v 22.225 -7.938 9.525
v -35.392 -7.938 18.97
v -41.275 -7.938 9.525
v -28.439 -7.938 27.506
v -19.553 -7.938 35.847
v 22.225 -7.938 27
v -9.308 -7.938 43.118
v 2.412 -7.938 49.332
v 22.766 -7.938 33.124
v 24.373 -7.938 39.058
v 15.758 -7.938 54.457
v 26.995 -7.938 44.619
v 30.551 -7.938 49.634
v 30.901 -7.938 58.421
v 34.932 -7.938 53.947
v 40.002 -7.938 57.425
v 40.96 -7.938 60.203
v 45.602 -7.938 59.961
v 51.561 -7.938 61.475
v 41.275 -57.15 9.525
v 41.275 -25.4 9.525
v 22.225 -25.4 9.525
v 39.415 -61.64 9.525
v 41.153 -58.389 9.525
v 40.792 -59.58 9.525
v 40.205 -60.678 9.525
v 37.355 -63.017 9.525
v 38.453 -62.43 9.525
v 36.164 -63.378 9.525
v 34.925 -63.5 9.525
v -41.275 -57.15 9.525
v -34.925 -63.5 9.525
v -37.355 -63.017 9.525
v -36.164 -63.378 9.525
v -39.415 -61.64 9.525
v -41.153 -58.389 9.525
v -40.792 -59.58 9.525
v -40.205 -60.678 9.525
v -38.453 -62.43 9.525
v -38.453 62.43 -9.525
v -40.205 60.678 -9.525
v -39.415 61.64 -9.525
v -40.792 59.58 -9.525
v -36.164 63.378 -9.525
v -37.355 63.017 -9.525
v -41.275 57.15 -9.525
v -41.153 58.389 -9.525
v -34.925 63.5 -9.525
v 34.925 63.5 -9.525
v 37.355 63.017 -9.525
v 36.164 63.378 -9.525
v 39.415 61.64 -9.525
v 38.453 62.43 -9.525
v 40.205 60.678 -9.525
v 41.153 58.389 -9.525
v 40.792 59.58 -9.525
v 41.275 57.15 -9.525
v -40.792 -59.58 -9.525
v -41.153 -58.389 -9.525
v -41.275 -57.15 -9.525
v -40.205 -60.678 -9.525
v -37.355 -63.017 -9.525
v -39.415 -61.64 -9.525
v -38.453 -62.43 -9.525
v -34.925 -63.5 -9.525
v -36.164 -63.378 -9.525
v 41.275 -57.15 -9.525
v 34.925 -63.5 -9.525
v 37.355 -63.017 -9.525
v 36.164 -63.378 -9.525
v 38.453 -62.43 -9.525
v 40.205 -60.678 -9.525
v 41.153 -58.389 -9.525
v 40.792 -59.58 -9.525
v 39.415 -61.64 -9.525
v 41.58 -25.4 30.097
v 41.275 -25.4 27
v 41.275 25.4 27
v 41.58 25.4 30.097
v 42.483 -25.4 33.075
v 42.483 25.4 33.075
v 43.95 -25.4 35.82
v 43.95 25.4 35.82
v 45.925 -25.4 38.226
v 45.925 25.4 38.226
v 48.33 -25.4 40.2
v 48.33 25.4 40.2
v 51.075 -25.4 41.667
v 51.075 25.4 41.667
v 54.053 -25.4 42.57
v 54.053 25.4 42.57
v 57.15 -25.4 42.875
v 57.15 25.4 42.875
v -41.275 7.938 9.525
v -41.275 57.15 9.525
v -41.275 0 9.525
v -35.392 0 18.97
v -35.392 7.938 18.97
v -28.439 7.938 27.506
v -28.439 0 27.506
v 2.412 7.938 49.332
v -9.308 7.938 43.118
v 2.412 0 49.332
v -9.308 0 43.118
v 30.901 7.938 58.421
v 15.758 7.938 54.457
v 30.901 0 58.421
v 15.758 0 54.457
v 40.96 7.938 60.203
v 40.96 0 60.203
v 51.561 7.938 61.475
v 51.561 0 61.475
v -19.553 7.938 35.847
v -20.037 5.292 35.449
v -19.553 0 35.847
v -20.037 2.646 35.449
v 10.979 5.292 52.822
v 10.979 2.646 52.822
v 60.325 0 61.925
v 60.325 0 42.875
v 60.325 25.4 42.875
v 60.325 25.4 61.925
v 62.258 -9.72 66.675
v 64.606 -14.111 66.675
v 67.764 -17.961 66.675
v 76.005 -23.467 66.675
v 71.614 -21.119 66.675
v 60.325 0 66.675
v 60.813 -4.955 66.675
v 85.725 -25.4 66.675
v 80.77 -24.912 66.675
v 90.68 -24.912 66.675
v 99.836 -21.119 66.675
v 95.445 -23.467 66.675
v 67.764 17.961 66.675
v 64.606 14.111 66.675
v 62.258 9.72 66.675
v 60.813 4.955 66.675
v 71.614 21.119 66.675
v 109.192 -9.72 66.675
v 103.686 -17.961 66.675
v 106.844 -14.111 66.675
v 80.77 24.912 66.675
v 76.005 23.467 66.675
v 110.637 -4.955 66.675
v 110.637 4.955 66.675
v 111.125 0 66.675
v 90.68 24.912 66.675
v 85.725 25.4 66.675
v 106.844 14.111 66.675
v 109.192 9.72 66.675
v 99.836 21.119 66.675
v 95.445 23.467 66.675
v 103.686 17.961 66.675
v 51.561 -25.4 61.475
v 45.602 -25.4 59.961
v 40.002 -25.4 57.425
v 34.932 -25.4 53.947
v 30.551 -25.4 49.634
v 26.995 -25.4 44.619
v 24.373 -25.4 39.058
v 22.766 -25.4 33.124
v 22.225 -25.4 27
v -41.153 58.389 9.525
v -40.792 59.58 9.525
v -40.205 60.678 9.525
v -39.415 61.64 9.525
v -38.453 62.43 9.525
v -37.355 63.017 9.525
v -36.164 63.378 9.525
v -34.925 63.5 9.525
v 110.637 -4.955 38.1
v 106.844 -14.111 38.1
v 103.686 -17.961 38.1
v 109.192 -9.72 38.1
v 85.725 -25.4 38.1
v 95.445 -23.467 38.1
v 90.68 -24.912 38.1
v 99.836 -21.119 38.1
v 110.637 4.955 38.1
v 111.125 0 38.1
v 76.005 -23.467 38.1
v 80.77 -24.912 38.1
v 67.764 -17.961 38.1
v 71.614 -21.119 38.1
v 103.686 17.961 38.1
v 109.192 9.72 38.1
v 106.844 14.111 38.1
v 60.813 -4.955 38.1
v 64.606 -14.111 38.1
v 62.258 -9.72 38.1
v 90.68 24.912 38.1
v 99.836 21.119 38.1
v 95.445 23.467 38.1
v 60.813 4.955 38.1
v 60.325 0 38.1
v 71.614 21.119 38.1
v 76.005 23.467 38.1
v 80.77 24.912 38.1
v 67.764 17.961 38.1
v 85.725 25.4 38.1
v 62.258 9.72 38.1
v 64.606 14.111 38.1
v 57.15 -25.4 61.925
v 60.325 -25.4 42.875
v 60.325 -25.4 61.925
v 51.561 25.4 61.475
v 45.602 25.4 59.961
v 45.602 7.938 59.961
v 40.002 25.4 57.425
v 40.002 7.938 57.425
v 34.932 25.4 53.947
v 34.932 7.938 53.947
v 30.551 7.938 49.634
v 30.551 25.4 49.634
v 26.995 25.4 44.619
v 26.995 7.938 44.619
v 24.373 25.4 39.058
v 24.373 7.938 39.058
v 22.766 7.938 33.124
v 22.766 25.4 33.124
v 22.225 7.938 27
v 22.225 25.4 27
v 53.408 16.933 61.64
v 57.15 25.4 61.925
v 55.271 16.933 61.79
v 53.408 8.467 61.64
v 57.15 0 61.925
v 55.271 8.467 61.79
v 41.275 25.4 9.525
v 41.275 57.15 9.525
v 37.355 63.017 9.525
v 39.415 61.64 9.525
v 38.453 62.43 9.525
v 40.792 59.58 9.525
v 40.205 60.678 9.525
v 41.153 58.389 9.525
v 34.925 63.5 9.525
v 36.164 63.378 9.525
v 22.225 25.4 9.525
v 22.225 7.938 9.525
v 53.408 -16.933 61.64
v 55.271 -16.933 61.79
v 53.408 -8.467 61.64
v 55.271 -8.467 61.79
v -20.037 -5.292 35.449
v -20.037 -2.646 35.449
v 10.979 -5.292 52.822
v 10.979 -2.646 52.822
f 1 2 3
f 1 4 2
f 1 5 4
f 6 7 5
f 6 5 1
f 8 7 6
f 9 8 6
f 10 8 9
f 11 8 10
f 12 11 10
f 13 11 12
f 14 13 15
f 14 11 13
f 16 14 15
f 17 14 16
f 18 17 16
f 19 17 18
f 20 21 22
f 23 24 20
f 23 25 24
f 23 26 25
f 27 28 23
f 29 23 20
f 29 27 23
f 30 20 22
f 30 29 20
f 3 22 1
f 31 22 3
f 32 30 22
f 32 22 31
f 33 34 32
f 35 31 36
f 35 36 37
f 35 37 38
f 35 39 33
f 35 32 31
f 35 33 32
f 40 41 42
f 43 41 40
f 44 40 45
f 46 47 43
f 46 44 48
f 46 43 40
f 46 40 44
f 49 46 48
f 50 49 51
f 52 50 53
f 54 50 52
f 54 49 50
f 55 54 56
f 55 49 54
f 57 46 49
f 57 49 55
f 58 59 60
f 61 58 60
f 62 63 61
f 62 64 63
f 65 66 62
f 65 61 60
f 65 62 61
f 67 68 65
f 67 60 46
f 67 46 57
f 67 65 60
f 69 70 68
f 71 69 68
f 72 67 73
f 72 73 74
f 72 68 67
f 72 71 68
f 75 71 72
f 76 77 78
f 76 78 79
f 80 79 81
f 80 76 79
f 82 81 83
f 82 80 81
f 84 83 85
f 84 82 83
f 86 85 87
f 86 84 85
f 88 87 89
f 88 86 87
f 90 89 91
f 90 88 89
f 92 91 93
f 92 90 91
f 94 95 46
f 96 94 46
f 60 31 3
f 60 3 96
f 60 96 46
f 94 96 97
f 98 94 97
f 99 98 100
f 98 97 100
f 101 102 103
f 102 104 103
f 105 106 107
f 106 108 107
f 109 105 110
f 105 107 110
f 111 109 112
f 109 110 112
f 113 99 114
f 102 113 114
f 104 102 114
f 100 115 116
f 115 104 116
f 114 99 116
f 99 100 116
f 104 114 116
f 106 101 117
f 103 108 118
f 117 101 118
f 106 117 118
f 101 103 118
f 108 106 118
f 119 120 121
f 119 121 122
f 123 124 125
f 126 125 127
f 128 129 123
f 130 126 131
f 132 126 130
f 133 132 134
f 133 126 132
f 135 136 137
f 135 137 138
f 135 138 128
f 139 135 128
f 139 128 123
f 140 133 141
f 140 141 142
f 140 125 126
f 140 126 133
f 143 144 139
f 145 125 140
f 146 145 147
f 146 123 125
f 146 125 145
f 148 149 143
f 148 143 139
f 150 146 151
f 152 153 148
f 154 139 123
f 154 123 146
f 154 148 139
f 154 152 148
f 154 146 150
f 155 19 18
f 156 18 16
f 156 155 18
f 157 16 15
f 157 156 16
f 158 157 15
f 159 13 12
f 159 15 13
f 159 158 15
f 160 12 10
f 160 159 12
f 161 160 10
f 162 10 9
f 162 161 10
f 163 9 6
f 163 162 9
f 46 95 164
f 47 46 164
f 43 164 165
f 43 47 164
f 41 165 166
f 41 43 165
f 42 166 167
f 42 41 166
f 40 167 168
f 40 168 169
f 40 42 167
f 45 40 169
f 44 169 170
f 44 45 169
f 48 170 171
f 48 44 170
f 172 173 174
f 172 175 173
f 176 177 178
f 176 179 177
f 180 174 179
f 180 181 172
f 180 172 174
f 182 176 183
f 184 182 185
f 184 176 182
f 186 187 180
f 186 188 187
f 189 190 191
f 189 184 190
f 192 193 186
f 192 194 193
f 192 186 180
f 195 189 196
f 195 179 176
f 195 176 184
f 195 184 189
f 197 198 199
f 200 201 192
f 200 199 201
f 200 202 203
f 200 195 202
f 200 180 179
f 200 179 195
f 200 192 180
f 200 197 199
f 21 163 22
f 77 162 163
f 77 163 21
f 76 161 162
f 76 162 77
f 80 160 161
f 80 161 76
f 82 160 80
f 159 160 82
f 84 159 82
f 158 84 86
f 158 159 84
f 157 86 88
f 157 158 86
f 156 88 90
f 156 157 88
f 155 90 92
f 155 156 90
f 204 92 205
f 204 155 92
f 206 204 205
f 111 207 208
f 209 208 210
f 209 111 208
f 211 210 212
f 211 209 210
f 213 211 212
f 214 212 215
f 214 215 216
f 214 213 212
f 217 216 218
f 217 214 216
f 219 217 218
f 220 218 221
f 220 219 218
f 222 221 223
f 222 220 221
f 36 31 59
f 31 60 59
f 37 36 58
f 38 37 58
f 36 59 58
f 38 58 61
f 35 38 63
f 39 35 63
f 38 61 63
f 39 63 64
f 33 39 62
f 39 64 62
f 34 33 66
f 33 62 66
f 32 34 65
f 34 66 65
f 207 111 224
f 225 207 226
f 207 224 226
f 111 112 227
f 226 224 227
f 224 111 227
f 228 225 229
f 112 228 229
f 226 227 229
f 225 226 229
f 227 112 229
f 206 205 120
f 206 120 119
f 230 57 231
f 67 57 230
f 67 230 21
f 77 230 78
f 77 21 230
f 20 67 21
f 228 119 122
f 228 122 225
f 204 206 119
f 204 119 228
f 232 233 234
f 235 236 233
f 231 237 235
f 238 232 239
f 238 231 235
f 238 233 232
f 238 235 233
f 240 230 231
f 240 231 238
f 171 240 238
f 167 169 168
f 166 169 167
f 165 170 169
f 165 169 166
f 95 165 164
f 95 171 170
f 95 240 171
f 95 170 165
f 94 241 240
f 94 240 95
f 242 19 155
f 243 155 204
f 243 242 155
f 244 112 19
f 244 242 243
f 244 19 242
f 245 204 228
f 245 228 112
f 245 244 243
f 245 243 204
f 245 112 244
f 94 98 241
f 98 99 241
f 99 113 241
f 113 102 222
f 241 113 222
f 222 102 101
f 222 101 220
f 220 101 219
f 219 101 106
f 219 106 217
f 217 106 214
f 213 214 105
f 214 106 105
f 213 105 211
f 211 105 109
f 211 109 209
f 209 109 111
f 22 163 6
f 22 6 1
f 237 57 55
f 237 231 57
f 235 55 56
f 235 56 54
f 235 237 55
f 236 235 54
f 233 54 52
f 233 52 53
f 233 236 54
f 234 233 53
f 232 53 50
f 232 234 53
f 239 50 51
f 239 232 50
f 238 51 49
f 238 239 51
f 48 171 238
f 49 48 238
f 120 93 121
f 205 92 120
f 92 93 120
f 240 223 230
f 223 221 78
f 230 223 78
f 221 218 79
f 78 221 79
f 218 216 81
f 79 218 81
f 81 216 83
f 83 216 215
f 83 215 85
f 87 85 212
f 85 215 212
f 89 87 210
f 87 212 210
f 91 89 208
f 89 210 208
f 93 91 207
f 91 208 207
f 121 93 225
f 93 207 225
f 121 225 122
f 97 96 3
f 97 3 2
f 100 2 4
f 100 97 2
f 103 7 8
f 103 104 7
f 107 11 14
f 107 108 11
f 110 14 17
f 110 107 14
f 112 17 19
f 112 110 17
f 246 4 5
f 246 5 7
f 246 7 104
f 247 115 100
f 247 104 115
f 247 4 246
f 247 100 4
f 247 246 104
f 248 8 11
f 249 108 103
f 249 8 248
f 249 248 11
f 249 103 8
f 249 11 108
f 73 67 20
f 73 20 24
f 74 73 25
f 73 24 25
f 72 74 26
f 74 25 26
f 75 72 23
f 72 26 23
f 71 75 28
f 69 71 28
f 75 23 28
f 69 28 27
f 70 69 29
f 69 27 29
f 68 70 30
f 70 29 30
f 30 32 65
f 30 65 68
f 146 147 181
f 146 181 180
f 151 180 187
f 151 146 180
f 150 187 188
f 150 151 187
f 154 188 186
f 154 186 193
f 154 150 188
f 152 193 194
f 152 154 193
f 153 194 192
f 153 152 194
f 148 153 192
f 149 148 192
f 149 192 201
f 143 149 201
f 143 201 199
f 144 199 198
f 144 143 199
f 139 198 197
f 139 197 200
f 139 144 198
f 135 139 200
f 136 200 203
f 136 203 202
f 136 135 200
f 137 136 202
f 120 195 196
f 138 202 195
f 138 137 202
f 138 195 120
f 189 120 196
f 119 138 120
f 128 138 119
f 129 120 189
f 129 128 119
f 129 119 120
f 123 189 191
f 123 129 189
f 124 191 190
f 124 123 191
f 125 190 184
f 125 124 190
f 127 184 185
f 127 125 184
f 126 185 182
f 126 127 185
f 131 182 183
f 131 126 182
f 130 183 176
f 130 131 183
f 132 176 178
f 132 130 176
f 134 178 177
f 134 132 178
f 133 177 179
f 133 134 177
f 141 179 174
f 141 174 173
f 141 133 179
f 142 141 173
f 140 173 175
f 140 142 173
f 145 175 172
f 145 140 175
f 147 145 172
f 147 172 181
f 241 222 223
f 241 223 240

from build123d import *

# Parameters (mm, degrees)
F1_DEPTH = 63.5
F2_DEPTH = 25.4
F3_DEPTH = 7.9375
F5_R     = 6.35


with BuildPart() as f1:
    # F0 (on Front) → F1 (new body, symmetric)
    with BuildSketch(Plane.XZ):
        Polygon((41.275, -9.525), (41.275, 9.525), (22.225, 9.525), (-41.275, 9.525), (-41.275, -9.525), align=None)
    extrude(amount=F1_DEPTH, both=True)

    # F0 (on Front) → F2 (join, symmetric)
    with BuildSketch(Plane.XZ):
        with BuildLine():
            Line((22.225, 9.525), (41.275, 9.525))
            Line((41.275, 9.525), (41.275, 27.0002))
            ThreePointArc((41.275, 27.0002), (45.92468, 38.22552), (57.15, 42.8752))
            Line((57.15, 42.8752), (60.325, 42.8752))
            Line((60.325, 42.8752), (60.325, 61.9252))
            Line((60.325, 61.9252), (57.15, 61.9252))
            add(Edge.make_bspline(
                [(51.560681, 61.475048), (53.40065, 61.64712), (55.263777, 61.797188), (57.15, 61.9252)],
                knots=[107.151836, 107.151836, 107.151836, 107.151836, 111.504536, 111.504536, 111.504536, 111.504536], degree=3))
            ThreePointArc((51.560681, 61.475048), (30.551479, 49.633678), (22.225, 27.0002))
            Line((22.225, 27.0002), (22.225, 9.525))
        make_face()
    extrude(amount=F2_DEPTH, both=True)

    # F0 (on Front) → F3 (join, symmetric)
    with BuildSketch(Plane.XZ):
        with BuildLine():
            Line((-41.275, 9.525), (22.225, 9.525))
            Line((22.225, 9.525), (22.225, 27.0002))
            ThreePointArc((22.225, 27.0002), (30.551479, 49.633678), (51.560681, 61.475048))
            add(Edge.make_bspline(
                [(-41.275, 9.525), (-24.995164, 39.667875), (6.26556, 57.239079), (51.560681, 61.475048)],
                knots=[0, 0, 0, 0, 107.151836, 107.151836, 107.151836, 107.151836], degree=3))
        make_face()
    extrude(amount=F3_DEPTH, both=True)

    # F0 (on Front) → F4 (revolve)
    with BuildSketch(Plane.XZ):
        Polygon((85.725, 61.9252), (85.725, 42.8752), (85.725, 38.1), (111.125, 38.1), (111.125, 66.675), (85.725, 66.675), align=None)
    revolve(axis=Axis((85.725, 0, 52.3875), (0, 0, 1)))

    # F5
    f5_edges = [f1.edges().sort_by_distance(p)[0] for p in [
        (-41.275, -63.5, 0),
        (-41.275, 63.5, 0),
        (41.275, -63.5, 0),
        (41.275, 63.5, 0),
    ]]
    fillet(f5_edges, radius=F5_R)


solid = f1.part
